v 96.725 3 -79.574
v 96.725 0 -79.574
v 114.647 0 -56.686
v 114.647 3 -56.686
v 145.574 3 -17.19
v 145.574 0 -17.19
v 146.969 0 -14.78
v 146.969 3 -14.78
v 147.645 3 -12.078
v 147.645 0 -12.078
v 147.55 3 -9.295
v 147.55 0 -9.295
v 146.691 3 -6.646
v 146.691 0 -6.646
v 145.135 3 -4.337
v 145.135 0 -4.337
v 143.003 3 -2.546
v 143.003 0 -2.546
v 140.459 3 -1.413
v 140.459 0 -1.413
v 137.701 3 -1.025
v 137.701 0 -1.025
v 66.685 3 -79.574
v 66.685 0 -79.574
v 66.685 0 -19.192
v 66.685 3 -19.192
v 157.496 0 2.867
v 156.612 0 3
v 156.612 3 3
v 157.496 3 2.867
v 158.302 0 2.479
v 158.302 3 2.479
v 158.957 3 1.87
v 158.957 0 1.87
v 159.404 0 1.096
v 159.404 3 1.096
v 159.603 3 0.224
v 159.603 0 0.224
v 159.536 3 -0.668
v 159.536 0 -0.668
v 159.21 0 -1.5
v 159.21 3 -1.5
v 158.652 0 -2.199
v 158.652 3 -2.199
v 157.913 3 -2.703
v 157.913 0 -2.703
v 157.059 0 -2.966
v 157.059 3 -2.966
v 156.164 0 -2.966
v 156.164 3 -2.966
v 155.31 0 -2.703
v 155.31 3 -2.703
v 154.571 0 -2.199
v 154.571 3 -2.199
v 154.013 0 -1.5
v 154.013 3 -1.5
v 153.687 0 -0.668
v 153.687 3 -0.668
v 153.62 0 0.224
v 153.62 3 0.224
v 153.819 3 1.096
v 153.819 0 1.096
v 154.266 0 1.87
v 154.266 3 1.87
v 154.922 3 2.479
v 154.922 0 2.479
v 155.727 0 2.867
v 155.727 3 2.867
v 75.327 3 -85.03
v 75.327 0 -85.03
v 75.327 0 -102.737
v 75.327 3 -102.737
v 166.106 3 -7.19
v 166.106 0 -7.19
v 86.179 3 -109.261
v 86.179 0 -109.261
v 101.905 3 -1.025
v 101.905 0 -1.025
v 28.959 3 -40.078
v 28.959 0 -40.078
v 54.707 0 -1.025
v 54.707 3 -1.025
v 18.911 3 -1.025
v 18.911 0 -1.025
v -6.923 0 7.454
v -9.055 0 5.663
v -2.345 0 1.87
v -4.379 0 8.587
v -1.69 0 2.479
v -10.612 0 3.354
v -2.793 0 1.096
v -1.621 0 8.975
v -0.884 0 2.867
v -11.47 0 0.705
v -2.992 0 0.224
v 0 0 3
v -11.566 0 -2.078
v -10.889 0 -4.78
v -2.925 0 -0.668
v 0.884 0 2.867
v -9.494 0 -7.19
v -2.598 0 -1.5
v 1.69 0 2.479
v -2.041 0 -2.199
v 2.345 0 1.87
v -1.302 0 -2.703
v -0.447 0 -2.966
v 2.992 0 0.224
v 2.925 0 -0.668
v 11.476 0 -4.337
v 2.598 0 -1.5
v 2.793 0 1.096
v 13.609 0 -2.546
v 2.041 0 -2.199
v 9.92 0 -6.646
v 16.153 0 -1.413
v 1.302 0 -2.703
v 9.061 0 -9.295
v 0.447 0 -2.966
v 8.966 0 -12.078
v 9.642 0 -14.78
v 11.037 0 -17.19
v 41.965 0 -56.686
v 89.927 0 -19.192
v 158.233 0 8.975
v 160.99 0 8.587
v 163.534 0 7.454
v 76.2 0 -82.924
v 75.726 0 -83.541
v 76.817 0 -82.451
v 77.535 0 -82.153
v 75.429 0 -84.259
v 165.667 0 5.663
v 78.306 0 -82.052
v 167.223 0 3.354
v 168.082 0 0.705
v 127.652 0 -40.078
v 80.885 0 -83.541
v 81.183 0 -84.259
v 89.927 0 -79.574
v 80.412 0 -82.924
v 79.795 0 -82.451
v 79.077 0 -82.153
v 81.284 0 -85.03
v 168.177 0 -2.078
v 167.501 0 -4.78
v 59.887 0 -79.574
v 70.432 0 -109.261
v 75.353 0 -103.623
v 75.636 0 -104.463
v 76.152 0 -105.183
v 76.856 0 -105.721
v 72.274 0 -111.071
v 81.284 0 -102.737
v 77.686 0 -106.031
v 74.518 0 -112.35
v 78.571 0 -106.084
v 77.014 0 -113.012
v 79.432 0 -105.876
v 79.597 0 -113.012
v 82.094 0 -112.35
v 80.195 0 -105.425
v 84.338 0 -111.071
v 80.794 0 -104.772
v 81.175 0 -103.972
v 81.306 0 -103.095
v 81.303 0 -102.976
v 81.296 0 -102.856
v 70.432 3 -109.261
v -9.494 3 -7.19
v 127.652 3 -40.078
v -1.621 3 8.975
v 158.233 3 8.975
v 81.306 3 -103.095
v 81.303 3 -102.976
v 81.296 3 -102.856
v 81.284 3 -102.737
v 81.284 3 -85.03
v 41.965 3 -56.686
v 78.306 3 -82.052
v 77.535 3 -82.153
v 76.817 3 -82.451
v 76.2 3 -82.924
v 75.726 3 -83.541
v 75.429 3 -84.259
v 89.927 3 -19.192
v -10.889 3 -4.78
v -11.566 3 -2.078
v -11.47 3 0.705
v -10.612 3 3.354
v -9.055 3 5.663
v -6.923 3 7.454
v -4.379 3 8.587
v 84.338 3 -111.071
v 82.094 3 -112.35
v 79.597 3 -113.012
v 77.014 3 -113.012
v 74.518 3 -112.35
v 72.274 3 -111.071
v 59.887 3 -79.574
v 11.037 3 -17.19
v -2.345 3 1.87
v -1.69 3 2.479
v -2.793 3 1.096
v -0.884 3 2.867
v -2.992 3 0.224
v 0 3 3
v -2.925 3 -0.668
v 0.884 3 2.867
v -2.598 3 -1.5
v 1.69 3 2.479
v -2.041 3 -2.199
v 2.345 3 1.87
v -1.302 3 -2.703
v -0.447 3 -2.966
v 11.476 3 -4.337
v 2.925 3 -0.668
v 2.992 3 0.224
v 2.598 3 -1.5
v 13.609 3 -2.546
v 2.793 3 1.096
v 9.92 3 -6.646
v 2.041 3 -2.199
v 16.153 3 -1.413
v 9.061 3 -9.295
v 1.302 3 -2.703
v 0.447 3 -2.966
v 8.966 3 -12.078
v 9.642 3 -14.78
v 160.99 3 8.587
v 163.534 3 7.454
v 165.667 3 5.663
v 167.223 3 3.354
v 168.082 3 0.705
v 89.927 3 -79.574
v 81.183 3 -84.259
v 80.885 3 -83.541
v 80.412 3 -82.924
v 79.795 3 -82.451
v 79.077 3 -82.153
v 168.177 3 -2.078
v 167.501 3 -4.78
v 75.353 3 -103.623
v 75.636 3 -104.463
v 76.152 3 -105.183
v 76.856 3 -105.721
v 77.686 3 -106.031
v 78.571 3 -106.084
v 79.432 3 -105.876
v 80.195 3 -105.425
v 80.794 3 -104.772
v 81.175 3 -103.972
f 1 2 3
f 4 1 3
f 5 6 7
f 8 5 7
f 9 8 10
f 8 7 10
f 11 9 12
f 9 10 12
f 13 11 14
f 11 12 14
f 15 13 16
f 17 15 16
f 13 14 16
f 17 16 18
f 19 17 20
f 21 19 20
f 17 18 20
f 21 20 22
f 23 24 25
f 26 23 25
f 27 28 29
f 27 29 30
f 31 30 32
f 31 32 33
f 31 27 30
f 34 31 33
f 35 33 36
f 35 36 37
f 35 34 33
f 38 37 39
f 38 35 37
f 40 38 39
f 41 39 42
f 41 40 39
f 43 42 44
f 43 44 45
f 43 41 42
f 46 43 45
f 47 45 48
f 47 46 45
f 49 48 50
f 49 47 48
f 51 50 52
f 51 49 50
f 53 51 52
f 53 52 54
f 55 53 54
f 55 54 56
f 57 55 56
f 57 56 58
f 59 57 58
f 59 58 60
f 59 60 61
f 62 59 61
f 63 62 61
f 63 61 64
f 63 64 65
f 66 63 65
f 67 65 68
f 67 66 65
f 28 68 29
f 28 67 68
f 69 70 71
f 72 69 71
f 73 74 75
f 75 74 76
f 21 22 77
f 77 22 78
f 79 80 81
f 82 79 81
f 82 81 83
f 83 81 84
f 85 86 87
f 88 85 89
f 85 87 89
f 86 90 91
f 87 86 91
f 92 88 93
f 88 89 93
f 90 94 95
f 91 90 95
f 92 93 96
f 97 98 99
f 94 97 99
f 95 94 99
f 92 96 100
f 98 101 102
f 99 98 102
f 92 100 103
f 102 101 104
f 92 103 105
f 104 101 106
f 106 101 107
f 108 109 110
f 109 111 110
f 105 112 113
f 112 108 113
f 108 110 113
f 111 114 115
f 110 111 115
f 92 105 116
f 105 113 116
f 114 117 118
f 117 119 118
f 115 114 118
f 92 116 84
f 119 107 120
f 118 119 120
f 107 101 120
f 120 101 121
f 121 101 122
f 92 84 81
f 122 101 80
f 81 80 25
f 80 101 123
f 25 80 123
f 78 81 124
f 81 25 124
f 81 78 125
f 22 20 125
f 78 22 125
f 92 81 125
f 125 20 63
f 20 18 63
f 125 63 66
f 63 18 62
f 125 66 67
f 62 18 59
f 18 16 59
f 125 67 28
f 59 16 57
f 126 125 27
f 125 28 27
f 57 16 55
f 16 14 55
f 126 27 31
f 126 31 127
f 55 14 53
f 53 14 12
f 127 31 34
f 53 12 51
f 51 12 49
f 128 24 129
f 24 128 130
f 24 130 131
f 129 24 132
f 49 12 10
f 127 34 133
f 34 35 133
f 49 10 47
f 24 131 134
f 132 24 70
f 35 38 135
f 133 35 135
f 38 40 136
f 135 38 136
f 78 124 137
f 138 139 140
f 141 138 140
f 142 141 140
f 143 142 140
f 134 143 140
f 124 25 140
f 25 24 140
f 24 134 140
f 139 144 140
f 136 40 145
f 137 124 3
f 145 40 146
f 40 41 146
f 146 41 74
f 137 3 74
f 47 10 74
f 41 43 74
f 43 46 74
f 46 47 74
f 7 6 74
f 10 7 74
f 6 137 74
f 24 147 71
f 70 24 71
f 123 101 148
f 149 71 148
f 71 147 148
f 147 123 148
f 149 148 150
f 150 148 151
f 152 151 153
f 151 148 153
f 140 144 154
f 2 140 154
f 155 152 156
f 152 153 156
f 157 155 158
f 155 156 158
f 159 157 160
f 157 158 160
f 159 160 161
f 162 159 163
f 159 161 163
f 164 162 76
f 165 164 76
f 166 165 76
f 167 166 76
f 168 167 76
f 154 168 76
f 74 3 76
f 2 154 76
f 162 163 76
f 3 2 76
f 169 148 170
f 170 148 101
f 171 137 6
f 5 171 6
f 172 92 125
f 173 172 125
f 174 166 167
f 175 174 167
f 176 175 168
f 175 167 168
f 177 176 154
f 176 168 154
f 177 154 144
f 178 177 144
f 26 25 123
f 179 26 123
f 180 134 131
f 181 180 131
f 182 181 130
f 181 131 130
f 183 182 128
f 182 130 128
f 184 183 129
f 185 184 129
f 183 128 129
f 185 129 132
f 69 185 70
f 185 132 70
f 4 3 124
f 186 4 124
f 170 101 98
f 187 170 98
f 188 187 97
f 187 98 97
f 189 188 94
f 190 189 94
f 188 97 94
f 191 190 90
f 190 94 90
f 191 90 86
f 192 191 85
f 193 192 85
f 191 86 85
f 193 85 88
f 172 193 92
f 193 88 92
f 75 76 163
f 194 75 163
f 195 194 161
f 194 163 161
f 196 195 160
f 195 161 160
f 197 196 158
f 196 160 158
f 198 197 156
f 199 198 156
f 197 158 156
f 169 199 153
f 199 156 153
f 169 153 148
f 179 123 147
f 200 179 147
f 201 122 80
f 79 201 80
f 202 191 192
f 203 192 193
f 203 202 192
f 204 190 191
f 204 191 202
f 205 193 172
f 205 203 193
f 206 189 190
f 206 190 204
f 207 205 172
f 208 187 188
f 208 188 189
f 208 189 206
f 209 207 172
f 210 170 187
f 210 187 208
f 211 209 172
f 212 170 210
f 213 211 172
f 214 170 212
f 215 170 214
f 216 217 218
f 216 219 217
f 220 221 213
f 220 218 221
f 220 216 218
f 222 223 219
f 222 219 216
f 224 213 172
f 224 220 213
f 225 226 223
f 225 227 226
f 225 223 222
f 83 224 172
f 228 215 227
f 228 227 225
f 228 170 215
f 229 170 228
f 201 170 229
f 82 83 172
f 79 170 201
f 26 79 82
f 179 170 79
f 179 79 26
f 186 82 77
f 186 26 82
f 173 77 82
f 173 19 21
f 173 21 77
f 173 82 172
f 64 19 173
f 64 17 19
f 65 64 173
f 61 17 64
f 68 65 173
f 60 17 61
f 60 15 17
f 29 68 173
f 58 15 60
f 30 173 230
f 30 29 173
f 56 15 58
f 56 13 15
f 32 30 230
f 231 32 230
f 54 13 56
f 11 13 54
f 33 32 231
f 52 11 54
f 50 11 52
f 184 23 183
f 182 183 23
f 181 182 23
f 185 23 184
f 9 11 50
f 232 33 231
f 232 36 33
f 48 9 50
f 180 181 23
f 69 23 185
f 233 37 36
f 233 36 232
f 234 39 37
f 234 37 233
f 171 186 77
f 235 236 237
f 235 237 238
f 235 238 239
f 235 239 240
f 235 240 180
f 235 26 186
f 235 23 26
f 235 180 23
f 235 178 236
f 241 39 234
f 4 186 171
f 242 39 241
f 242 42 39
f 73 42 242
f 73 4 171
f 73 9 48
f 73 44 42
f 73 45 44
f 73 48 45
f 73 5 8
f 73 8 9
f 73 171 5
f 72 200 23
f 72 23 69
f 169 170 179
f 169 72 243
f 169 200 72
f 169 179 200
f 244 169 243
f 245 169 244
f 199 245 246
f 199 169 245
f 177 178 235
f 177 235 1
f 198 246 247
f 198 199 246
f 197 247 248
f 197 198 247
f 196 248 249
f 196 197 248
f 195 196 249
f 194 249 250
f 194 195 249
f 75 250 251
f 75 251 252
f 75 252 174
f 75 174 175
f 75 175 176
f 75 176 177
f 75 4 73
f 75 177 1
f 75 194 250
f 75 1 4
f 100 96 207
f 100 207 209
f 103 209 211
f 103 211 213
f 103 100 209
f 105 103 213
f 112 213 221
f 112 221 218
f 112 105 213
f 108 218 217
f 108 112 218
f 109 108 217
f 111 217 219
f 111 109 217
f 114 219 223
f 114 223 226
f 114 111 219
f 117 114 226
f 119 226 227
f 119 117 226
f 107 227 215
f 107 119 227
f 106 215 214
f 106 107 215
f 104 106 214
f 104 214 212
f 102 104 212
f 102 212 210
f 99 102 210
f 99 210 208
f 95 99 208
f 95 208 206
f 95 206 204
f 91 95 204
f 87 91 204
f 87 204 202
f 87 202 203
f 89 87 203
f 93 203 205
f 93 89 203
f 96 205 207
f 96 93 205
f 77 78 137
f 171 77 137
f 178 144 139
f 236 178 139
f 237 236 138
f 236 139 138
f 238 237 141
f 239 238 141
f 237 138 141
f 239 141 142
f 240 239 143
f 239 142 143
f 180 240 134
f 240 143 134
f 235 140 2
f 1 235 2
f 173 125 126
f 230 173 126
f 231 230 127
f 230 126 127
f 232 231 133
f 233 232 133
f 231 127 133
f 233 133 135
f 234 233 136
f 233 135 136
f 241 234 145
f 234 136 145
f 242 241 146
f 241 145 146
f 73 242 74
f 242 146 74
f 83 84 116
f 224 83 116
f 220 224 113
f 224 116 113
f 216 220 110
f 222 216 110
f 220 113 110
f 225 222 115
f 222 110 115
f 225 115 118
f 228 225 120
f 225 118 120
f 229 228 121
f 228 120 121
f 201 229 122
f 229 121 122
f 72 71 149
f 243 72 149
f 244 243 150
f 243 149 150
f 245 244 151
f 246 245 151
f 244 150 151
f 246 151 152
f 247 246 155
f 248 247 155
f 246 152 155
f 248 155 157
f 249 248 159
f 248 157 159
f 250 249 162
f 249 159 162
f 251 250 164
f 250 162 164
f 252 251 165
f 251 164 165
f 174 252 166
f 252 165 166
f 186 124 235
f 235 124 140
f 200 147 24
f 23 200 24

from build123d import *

# Parameters (mm, degrees)
SKETCH1_R           = 3
BOSS_EXTRUDE1_DEPTH = 3


with BuildPart() as part:
    # Sketch1 → Boss-Extrude1 (new body)
    with BuildSketch(Plane(origin=(0, 0, 0), x_dir=(1, 0, 0), z_dir=(0, 1, 0))):
        with BuildLine():
            ThreePointArc((158.232733492, -8.975009298), (167.223082652, -3.353778756), (166.106066757, 7.190266308))
            Line((166.106066757, 7.190266308), (86.179120629, 109.260558707))
            ThreePointArc((86.179120629, 109.260558707), (78.305787364, 113.095283102), (70.432454098, 109.260558707))
            Line((70.432454098, 109.260558707), (-9.49449203, 7.190266308))
            ThreePointArc((-9.49449203, 7.190266308), (-10.611507924, -3.353778756), (-1.621158764, -8.975009298))
            Line((-1.621158764, -8.975009298), (78.305787364, -8.975009298))
            Line((78.305787364, -8.975009298), (158.232733492, -8.975009298))
        make_face()
        with Locations(Location((0, 0, 0), (0, 0, 270))):
            Circle(SKETCH1_R, mode=Mode.SUBTRACT)
        with BuildLine():
            ThreePointArc((18.910520844, 1.024990702), (9.920171683, 6.646221244), (11.037187578, 17.190266308))
            Line((11.037187578, 17.190266308), (28.959351543, 40.077672933))
            Line((28.959351543, 40.077672933), (54.70682481, 1.024990702))
            Line((54.70682481, 1.024990702), (18.910520844, 1.024990702))
        make_face(mode=Mode.SUBTRACT)
        Polygon((59.887035288, 79.573711202), (66.6846286, 79.573711202), (66.6846286, 66.364650506), (66.6846286, 19.192418643), (41.964871323, 56.686304577), align=None, mode=Mode.SUBTRACT)
        with Locations(Location((156.611574728, 0, 0), (0, 0, 270))):
            Circle(SKETCH1_R, mode=Mode.SUBTRACT)
        with BuildLine():
            Line((137.701053884, 1.024990702), (101.904749918, 1.024990702))
            Line((101.904749918, 1.024990702), (127.652223184, 40.077672933))
            Line((127.652223184, 40.077672933), (145.574387149, 17.190266308))
            ThreePointArc((145.574387149, 17.190266308), (146.691403044, 6.646221244), (137.701053884, 1.024990702))
        make_face(mode=Mode.SUBTRACT)
        Polygon((114.646703405, 56.686304577), (89.926946128, 19.192418643), (89.926946128, 79.573711202), (96.72453944, 79.573711202), align=None, mode=Mode.SUBTRACT)
        with BuildLine():
            ThreePointArc((81.284347166, 85.030073249), (80.411947198, 82.923913414), (78.305787364, 82.051513446))
            ThreePointArc((78.305787364, 82.051513446), (76.199627529, 82.923913414), (75.327227561, 85.030073249))
            Line((75.327227561, 85.030073249), (75.327227561, 102.737258658))
            ThreePointArc((75.327227561, 102.737258658), (78.126454444, 106.089918256), (81.305787364, 103.095283102))
            ThreePointArc((81.305787364, 103.095283102), (81.300422517, 102.915950182), (81.284347166, 102.737258658))
            Line((81.284347166, 102.737258658), (81.284347166, 85.030073249))
        make_face(mode=Mode.SUBTRACT)
    extrude(amount=BOSS_EXTRUDE1_DEPTH)


solid = part.part
